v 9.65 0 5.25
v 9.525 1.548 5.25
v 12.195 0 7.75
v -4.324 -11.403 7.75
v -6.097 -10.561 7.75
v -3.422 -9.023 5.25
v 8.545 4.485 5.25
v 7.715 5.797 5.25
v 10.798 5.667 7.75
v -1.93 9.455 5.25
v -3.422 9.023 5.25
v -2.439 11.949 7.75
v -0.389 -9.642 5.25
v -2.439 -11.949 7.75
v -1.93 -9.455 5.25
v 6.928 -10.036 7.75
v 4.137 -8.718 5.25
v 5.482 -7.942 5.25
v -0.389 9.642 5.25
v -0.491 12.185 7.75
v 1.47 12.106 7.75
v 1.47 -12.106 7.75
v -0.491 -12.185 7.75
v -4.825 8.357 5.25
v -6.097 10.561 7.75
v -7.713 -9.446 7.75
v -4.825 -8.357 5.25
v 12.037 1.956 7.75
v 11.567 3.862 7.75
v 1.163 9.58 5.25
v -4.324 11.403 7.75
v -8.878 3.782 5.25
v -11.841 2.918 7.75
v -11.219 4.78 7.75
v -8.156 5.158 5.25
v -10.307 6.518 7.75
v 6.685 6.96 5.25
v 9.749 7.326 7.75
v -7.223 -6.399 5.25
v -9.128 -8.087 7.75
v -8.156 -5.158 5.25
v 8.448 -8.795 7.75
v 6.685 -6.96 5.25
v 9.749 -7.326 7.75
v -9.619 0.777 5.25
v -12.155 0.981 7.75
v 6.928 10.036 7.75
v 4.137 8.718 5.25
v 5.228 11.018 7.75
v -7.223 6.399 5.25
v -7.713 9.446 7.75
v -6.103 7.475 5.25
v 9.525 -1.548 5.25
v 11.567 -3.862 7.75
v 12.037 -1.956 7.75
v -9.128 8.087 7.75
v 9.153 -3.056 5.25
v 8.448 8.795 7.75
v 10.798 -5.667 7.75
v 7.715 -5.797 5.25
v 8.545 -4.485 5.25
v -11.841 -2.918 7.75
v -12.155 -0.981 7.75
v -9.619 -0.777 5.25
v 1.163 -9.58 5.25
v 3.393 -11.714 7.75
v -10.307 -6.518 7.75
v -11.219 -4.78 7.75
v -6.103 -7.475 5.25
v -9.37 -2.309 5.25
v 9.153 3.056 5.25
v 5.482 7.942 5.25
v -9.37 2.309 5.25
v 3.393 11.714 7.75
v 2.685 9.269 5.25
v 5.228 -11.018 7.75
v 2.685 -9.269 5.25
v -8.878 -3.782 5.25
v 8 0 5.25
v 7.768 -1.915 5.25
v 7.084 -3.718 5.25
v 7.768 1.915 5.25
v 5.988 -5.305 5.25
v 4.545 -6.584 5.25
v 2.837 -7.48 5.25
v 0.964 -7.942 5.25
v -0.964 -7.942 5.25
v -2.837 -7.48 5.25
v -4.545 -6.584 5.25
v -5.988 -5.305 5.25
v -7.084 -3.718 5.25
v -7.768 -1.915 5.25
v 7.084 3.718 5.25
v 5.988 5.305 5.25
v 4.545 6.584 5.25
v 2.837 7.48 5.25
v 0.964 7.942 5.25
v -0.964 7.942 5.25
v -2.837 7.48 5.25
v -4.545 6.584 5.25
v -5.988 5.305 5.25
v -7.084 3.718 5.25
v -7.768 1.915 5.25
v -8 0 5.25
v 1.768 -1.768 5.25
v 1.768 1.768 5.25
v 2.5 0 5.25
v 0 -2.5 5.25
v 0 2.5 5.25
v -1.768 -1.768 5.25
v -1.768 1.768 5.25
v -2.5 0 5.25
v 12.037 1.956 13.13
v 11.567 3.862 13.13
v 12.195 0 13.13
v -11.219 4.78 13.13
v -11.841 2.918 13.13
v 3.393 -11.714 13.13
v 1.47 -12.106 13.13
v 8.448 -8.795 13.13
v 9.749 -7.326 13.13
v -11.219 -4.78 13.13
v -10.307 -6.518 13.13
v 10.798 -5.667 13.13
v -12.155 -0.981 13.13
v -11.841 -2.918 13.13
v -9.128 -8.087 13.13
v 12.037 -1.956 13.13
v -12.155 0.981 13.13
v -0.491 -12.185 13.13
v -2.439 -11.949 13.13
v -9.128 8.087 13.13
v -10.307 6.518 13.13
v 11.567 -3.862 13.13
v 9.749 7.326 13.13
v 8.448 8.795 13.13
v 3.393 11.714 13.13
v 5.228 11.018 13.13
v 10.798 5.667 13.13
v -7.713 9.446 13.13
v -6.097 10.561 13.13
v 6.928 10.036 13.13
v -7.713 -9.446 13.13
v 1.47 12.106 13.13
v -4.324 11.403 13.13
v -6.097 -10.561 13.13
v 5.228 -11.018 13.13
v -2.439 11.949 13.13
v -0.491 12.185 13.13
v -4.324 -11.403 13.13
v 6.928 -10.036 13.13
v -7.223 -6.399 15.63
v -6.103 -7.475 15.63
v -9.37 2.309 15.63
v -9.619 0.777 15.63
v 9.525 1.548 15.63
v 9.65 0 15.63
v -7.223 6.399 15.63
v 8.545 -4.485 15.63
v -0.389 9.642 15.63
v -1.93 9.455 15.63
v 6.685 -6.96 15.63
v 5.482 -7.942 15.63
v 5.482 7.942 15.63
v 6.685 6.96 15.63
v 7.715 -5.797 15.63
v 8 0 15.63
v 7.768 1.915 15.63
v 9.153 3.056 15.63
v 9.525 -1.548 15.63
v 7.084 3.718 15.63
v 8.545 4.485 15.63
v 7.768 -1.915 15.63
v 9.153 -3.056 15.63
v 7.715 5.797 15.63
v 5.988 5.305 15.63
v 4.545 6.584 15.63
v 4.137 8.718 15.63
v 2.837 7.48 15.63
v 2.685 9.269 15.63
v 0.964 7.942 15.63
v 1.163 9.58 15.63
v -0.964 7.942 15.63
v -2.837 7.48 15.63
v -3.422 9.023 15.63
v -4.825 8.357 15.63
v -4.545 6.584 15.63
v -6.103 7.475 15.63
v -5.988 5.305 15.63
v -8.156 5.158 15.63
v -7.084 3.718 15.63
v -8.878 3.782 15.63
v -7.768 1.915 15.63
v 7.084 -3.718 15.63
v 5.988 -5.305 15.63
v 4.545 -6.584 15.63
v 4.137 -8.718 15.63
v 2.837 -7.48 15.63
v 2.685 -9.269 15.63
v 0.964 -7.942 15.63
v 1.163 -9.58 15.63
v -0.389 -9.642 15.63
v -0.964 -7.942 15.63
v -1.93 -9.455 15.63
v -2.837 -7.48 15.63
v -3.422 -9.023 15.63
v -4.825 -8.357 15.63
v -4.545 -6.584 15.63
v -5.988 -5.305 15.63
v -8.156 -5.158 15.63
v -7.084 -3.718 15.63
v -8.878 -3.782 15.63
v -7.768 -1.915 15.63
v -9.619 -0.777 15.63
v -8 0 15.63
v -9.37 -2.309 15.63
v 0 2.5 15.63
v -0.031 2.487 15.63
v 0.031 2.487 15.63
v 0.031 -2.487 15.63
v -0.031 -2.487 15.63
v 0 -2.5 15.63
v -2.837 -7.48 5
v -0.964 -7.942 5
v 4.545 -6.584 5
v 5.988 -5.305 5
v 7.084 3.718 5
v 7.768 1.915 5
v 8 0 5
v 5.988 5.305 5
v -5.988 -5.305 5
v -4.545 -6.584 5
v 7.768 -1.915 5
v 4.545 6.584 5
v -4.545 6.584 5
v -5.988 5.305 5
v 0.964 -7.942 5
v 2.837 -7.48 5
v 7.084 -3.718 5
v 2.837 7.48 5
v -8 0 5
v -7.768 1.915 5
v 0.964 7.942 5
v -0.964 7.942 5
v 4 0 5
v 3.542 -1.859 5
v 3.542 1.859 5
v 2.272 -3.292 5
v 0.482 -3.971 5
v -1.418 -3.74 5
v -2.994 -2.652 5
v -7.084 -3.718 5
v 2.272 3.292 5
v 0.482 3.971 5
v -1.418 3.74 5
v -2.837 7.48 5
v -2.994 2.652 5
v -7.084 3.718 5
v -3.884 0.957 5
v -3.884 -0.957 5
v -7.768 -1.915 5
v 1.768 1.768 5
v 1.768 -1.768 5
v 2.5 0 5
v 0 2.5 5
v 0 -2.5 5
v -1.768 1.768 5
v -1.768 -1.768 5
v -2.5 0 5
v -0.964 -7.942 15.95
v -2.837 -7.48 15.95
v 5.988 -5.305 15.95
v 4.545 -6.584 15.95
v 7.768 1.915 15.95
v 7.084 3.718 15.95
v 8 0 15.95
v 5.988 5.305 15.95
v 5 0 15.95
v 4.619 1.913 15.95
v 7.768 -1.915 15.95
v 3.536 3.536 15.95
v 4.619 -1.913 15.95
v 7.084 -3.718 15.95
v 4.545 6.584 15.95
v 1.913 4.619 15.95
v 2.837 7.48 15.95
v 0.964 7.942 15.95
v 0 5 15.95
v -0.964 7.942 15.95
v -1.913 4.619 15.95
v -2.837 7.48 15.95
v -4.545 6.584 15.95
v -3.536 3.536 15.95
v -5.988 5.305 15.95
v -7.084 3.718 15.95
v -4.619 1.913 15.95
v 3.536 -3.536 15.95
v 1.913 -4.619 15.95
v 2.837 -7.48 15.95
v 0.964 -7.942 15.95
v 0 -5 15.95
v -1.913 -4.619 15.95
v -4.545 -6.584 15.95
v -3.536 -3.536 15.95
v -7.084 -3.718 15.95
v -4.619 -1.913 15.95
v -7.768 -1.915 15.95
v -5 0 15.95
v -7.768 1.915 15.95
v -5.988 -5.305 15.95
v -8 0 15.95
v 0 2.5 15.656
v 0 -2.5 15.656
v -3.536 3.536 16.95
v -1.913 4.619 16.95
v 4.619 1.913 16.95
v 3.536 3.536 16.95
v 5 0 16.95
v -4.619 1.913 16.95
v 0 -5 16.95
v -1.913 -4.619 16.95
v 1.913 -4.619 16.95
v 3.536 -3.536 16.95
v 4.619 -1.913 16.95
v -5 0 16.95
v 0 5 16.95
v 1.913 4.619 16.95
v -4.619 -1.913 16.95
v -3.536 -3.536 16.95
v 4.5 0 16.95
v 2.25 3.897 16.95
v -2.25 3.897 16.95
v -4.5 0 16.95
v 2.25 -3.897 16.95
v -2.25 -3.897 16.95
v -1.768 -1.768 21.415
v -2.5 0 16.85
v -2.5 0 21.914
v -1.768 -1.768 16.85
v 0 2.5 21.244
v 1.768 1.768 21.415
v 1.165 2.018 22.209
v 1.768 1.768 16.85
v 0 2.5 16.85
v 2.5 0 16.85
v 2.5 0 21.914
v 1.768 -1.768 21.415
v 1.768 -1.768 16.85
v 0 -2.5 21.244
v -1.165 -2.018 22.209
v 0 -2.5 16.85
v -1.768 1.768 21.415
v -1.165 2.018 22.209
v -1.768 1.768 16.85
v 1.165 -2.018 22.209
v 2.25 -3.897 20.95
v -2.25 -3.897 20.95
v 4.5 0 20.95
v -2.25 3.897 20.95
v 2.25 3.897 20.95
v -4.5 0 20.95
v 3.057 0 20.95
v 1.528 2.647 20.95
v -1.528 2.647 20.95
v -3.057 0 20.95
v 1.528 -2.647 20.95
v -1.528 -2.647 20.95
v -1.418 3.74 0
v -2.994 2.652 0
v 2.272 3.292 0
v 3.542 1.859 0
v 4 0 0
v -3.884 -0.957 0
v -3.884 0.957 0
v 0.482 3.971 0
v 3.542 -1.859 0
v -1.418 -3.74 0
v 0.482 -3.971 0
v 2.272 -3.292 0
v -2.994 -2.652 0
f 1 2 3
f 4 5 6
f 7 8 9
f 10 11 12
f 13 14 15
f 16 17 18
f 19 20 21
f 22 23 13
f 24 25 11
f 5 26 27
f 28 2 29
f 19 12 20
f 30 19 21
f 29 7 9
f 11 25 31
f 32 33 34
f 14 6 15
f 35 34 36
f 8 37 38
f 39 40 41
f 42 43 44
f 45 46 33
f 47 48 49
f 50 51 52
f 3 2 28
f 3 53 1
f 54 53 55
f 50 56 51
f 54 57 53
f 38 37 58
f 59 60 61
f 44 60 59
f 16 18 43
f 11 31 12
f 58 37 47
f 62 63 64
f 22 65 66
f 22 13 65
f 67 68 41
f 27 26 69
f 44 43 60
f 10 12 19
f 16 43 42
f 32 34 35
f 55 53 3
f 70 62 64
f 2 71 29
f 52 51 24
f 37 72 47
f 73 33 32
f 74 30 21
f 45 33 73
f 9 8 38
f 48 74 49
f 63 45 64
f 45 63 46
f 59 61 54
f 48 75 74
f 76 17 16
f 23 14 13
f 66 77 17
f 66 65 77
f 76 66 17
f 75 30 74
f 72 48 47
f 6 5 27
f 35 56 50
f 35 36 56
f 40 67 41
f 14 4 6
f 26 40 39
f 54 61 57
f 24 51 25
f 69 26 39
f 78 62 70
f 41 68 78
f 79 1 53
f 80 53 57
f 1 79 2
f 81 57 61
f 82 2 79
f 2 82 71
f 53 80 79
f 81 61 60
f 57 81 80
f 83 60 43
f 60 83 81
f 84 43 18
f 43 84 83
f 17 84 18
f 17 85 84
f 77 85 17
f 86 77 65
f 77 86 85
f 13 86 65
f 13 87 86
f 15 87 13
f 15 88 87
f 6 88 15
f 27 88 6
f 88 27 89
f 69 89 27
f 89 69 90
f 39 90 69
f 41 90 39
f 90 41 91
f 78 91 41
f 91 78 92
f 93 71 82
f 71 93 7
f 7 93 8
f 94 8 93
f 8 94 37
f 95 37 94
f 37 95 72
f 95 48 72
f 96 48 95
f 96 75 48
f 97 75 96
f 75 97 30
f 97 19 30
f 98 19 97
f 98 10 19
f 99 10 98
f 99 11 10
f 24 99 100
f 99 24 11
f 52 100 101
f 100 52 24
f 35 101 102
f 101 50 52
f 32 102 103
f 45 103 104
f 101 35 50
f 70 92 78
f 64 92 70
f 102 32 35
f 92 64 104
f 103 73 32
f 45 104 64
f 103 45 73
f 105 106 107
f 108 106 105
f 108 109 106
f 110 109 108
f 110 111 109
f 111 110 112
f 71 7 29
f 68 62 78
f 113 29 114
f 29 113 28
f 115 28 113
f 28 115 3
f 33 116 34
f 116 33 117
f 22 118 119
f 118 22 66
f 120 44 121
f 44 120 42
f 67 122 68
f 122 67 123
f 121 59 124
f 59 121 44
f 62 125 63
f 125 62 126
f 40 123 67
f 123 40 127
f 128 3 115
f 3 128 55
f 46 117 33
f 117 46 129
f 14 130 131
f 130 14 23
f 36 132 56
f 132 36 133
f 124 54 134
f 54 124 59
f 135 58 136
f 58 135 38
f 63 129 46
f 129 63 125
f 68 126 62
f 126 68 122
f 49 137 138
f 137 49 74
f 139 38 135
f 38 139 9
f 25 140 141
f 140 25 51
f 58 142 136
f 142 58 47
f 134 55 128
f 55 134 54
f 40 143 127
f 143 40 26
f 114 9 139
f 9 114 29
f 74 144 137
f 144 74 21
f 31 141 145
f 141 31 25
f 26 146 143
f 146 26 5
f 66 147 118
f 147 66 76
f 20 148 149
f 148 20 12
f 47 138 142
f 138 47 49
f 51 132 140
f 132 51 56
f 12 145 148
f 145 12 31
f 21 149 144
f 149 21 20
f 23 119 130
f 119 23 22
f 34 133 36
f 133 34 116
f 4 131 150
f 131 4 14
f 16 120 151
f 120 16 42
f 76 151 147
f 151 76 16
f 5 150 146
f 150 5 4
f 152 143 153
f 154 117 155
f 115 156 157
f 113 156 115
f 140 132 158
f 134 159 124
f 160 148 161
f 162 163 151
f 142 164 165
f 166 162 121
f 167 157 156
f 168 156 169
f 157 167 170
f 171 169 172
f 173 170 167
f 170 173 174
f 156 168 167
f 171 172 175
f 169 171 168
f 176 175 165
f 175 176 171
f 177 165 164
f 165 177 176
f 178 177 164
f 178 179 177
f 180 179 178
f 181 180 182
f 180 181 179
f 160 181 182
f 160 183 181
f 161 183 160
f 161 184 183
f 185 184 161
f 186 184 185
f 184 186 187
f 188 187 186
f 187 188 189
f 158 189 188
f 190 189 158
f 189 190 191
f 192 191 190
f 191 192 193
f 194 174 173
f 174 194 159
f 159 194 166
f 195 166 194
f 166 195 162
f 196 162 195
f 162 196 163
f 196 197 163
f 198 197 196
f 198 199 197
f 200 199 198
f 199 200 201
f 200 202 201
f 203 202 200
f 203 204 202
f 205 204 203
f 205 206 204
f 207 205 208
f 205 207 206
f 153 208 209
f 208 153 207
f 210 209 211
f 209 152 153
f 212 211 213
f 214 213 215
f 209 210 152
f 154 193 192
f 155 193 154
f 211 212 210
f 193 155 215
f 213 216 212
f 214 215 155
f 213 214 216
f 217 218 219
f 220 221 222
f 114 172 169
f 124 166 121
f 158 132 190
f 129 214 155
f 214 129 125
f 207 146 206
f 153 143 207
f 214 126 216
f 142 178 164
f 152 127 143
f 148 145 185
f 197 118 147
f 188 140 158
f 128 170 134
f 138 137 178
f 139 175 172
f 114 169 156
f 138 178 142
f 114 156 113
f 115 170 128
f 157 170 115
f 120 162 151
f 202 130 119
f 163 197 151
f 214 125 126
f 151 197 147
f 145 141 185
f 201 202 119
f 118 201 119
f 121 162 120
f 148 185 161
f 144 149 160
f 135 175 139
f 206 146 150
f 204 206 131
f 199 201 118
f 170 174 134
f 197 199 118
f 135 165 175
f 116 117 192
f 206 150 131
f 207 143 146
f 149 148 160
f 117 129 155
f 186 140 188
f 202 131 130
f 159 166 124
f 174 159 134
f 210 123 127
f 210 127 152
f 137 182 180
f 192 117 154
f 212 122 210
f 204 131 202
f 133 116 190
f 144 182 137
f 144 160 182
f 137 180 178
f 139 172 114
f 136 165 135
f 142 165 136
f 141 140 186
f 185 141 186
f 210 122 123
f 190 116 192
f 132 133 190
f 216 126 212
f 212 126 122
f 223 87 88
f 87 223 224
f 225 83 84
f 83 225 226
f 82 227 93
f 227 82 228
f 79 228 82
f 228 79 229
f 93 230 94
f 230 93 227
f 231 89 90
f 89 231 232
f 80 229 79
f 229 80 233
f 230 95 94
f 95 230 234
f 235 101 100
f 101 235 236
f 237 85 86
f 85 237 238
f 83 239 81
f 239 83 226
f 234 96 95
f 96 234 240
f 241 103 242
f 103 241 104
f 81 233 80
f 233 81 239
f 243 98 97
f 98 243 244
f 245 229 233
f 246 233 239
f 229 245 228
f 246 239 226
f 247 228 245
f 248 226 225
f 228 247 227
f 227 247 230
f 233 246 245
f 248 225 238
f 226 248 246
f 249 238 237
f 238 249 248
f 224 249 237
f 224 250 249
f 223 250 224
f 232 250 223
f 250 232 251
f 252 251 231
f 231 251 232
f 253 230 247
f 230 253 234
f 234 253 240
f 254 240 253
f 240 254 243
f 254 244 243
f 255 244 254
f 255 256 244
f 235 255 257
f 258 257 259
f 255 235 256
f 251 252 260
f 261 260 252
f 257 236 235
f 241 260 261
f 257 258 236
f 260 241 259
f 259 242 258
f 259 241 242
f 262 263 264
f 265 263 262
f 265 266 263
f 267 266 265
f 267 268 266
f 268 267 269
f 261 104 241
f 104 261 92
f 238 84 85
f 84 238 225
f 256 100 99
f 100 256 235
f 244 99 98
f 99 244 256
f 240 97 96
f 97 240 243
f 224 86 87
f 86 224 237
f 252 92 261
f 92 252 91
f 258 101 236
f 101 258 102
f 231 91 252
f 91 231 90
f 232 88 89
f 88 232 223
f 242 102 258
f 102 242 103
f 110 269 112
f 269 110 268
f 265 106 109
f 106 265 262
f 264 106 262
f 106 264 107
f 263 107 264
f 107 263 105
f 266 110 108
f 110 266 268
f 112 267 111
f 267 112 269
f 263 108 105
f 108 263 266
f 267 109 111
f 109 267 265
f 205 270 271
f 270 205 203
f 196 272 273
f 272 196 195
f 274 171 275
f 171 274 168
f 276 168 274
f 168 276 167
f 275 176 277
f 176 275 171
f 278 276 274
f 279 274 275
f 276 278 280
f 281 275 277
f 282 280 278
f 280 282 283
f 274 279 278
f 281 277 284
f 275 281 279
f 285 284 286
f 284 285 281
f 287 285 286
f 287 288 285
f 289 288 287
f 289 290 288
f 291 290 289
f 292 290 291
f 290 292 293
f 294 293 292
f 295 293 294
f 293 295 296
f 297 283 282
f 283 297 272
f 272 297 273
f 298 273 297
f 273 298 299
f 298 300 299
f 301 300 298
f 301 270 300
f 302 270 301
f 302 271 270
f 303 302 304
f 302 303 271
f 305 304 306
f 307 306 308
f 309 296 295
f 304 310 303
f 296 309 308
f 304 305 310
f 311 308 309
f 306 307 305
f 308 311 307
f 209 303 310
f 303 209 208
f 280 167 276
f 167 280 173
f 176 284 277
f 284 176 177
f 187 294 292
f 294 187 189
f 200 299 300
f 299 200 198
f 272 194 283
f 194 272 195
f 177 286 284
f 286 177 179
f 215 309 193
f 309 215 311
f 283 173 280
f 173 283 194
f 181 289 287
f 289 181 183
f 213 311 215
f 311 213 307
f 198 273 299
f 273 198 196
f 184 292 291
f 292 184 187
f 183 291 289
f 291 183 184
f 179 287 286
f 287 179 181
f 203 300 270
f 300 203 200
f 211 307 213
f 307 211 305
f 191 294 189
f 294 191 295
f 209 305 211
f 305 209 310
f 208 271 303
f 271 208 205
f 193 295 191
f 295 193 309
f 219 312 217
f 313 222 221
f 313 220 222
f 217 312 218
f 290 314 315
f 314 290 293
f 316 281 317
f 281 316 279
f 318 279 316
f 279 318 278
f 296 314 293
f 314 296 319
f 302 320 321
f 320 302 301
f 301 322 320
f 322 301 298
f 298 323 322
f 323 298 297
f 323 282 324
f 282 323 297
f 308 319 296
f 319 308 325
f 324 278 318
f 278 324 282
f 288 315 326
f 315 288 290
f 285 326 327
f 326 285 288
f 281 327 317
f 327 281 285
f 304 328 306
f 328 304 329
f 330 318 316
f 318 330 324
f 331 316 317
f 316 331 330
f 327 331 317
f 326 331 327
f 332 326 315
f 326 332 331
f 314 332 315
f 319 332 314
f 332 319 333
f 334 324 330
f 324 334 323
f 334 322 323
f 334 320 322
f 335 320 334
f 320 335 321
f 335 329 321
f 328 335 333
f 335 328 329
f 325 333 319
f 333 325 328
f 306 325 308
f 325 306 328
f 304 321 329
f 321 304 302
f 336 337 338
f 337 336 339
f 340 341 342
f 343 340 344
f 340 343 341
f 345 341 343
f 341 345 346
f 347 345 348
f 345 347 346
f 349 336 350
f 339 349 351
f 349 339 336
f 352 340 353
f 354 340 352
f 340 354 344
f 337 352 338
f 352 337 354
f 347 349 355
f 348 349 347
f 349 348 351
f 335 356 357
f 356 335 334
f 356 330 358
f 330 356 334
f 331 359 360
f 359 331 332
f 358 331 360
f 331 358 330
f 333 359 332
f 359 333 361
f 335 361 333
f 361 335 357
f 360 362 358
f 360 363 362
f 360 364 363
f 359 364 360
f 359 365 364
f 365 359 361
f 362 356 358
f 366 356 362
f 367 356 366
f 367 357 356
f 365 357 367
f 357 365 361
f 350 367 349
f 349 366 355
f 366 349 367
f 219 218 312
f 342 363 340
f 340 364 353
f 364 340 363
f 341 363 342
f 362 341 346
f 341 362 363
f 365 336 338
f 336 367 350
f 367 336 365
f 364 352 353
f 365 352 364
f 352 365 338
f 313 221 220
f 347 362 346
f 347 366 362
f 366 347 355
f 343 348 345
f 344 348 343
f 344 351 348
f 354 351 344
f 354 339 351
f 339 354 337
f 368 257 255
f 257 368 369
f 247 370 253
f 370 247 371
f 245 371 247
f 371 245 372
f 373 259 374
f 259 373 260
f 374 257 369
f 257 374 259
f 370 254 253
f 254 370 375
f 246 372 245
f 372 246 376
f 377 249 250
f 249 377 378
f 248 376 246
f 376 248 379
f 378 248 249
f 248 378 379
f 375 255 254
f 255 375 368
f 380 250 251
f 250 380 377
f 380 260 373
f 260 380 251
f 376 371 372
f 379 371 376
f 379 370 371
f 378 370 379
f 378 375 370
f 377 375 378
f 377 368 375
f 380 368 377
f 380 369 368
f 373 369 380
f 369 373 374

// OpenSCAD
// file: ../machine.scad
/*
 * Helpers for machinging; i.e. kerf alowances
 *
 * Copyright 2013 <b@Zi.iS>
 * License CC BY 3.0
 */

ZCUT = 0;
XOFF = 0;
YOFF = 0;

module drawing() {
	//create blueprint
	if(preview==0) {
		projection(cut=true) translate([
			XOFF,
			YOFF,
			ZCUT
		]) {
            if($children) children([0:$children-1]);
		}
	} else {
        if($children) children([0:$children-1]);
	}
}

module kerf_cube(
	size
) {
	translate([
		kerf/2*(1-preview),
		kerf/2*(1-preview),
		0
	]) {
		cube([
			size[0] - kerf*(1-preview),
			size[1] - kerf*(1-preview),
			size[2]
		]);
	}
}

module kerf_cylinder(
	r,
	h
) {
	cylinder(
		r = r - kerf/2*(1-preview),
		h = h
	);
}

module part(
	id,
	name
) {
	if(PART<1 || PART==id || id<0) {
		if(id>=0) echo(str("PART", id, ":", name));
        if($children) children([0:$children-1]);
	}	
}
// file: ../easing.scad
/*
 * Make allowances to ensure good fit.
 *
 * Copyright 2013 <b@Zi.iS>
 * License CC BY 3.0
 */

function ease(value) = min(value*1.1, value + .2);
// file: ../epslion.scad
/*
 * Slightly offset previews to overcome rounding issues
 *
 * Copyright 2013 <b@Zi.iS>
 * License CC BY 3.0
 */

include <config.scad>;

module e(
	shift = -.1,
	size = 1.1
) {
	if(preview == 1) {
		translate([
			0,
			0,
			shift
		]) {
			scale([
				1,
				1,
				size
			]) {
                if($children) children([0:$children-1]);
			}
		}
	} else {
        if($children) children([0:$children-1]);
	}
}

function space(pitch, i) = -pitch/2 + pitch*i;
// file: ../config.scad
/*
 * Default settings
 *
 * Copyright 2013 <b@Zi.iS>
 * License CC BY 3.0
 */

preview = 1;
$fa = 6;
$fs = 2 - 1.5*(1-preview);
kerf = .3;
PART = 0; //all

// preview colors
color_steel = [.8, .8, .8];
color_wood = [.3, .3, 0];
color_print = [0, .8, 0];
color_plastic = [.7, 1, .7];
color_brass = [181/255, 166/255, 66/255];
color_acrylic = [.9,.9,.9,.5];
// file: hardware.scad
/*
 * Metric hardware
 *
 * Copyright 2013 <b@Zi.iS>
 * License CC BY 3.0
 */

include <../main.scad>;

function m_washer_width(size) = size*.2;
function m_nut_width(size) = size*.8;
function m_nut_r(size) = size*1.8/2;

m_tap = [
    0,
    1.6,
    2.5,
    3.3,
    4.2,
    5,
    6.8,
    8.5,
    10.2
];

module m_washer(
	size = 3,
	id,
    fraction = 1
) {
	part(id, str("Washer M", size)) color(color_steel) {
		difference() {
			cylinder(
				r = size/2*2,
				h = size*.2 / fraction
			);
			e() cylinder(
				r = size/2,
				h = size*.2 / fraction
			);
		}
	}
	translate([
		0,
		0,
		size*.2 / fraction
	] * preview) {
		if($children) children([0:$children-1]);
	}
}

module m_nut(
	size = 3,
	id
) {
	part(id, str("Nut M", size)) color(color_steel) {
		difference() {
			cylinder(
				r = size*1.8/2,
				h = size*.8,
				$fn = 6
			);
			e() cylinder(
				r = size/2,
				h = size*.8
			);
		}
	}
	translate([
		0,
		0,
		size*.8
	] * preview) {
        if($children) children([0:$children-1]);
	}
}

m_nylock();

module m_nylock(
	size = 3,
	id
) {
	part(id, str("Nylock M", size)) color(color_steel) {
		difference() {
			union() {
				cylinder(
					r = size*1.8/2,
					h = size*0.8,
					$fn = 6
				);
				translate([
					0,
					0,
					size*0.3
				]) {
					sphere(
						r = size*1.8/2,
						$fn = 6
					);
				}
			}
			e() cylinder(
				r = size/2,
				h = size*1.5
			);
		}
	}
	translate([
		0,
		0,
		size
	]) {
        if($children) children([0:$children-1]);
	}
}

module m_tap(
    rod,
    h
) {
    kerf_cylinder(
        r = m_tap[rod]/2,
        h = h
    );
}
// file: bearing.scad
/*
 * radial bearing
 *
 * Copyright 2013 <b@Zi.iS>
 * License CC BY 3.0
 */

include <../main.scad>;

bearing60_size = [
	[],
	[],
	[],
	[],
	[],
	[],
	[
        6,
        17,
        6
    ],
	[],
	[
		8,
		22,
		7
	],
    [],
    [
        10,
        22,
        6
    ]
];

bearing67002_size = [
	[],
	[],
	[],
	[],
	[],
	[],
	[],
	[],
	[],
	[],
	[
		10,
		15,
		4
	]
];

//bearing60();

function bearing60_offset(size) = bearing60_size[size][1] - bearing60_size[size][0];
function bearing60_width(size) = bearing60_size[size][2];

module bearing60(
	size = 8,
	id
) {
	bearing(
		bearing60_size[size],
		id
	);
	translate([
		0,
		0,
		bearing60_size[size][2]
	] * preview) {
        if($children) children([0:$children-1]);
	}
}

module bearing(
	size = bearing60_size[8],
	id
) {
	part(id, str("Radial bearing: ID", size[0], "mm, OD", size[1], "×", 
size[2], "mm"))
	color(color_steel) {
		difference() {
			cylinder(
				r = size[1]/2,
				h = size[2]
			);
			e() cylinder(
				r = size[0]/2,
				h = size[2]
			);
		}
	}
	translate([
		0,
		0,
		size[2]
	] * preview) {
        if($children) children([0:$children-1]);
	}
}
// file: ../main.scad
/*
 * A library to make SCAD easier.
 *
 * Copyright 2013 <b@Zi.iS>
 * License CC BY 3.0
 */

include <config.scad>;
use <epslion.scad>;
use <easing.scad>;
include <machine.scad>;

nema_sizes = [
       [],
       [],
       [],
       [],
       [],
       [],
       [],
       [],
       [],
       [],
       [],
       [],
       [],
       [],
       [],
       [],
       [],
       [42.2, 31.04, 3],
       [],
       [],
       [],
       [],
       [],
       [57.15, 47.24, 5]
];
// main file
include <../main.scad>;
use <bearing.scad>;
use <hardware.scad>;

//20mm nominal spacing = ~19.8 for tension

v_wheel_mount();

module v_wheel_mount(id) {
	v_wheel_spacer(id= id) {
		v_wheel(id + 1);
		bearing([5, 16, 5], id=id+2)
			translate([0,0,.95])
				bearing([5, 16, 5], id=id+3)
					m_washer(5, id=id+4)
						m_nylock(5, id=id+5);
	}
}

module v_wheel(id) {
	part(id, "Solid V-Wheel")
		color([.3,.3,.3]) {
			translate([0,0,.25])
				cylinder(
					d1 = 19.3,
					d2 = 24.39,
					h = 2.5
				);
			translate([0,0,.25+2.5])
				cylinder(
					d = 24.39,
					h = 5.38
				);
		
			translate([0,0,.25+2.5+5.38])
				cylinder(
					d1 = 24.39,
					d2 = 19.3,
					h = 2.5
				);
		}
}

module v_wheel_spacer(length = 5, id) {
	part(id, str("V-Wheel spacer ", length, "mm"))
		color([.8,.8,.8])
			cylinder(
				d = 8,
				h = 5
			);
	translate([0, 0, length])
		children();
}
